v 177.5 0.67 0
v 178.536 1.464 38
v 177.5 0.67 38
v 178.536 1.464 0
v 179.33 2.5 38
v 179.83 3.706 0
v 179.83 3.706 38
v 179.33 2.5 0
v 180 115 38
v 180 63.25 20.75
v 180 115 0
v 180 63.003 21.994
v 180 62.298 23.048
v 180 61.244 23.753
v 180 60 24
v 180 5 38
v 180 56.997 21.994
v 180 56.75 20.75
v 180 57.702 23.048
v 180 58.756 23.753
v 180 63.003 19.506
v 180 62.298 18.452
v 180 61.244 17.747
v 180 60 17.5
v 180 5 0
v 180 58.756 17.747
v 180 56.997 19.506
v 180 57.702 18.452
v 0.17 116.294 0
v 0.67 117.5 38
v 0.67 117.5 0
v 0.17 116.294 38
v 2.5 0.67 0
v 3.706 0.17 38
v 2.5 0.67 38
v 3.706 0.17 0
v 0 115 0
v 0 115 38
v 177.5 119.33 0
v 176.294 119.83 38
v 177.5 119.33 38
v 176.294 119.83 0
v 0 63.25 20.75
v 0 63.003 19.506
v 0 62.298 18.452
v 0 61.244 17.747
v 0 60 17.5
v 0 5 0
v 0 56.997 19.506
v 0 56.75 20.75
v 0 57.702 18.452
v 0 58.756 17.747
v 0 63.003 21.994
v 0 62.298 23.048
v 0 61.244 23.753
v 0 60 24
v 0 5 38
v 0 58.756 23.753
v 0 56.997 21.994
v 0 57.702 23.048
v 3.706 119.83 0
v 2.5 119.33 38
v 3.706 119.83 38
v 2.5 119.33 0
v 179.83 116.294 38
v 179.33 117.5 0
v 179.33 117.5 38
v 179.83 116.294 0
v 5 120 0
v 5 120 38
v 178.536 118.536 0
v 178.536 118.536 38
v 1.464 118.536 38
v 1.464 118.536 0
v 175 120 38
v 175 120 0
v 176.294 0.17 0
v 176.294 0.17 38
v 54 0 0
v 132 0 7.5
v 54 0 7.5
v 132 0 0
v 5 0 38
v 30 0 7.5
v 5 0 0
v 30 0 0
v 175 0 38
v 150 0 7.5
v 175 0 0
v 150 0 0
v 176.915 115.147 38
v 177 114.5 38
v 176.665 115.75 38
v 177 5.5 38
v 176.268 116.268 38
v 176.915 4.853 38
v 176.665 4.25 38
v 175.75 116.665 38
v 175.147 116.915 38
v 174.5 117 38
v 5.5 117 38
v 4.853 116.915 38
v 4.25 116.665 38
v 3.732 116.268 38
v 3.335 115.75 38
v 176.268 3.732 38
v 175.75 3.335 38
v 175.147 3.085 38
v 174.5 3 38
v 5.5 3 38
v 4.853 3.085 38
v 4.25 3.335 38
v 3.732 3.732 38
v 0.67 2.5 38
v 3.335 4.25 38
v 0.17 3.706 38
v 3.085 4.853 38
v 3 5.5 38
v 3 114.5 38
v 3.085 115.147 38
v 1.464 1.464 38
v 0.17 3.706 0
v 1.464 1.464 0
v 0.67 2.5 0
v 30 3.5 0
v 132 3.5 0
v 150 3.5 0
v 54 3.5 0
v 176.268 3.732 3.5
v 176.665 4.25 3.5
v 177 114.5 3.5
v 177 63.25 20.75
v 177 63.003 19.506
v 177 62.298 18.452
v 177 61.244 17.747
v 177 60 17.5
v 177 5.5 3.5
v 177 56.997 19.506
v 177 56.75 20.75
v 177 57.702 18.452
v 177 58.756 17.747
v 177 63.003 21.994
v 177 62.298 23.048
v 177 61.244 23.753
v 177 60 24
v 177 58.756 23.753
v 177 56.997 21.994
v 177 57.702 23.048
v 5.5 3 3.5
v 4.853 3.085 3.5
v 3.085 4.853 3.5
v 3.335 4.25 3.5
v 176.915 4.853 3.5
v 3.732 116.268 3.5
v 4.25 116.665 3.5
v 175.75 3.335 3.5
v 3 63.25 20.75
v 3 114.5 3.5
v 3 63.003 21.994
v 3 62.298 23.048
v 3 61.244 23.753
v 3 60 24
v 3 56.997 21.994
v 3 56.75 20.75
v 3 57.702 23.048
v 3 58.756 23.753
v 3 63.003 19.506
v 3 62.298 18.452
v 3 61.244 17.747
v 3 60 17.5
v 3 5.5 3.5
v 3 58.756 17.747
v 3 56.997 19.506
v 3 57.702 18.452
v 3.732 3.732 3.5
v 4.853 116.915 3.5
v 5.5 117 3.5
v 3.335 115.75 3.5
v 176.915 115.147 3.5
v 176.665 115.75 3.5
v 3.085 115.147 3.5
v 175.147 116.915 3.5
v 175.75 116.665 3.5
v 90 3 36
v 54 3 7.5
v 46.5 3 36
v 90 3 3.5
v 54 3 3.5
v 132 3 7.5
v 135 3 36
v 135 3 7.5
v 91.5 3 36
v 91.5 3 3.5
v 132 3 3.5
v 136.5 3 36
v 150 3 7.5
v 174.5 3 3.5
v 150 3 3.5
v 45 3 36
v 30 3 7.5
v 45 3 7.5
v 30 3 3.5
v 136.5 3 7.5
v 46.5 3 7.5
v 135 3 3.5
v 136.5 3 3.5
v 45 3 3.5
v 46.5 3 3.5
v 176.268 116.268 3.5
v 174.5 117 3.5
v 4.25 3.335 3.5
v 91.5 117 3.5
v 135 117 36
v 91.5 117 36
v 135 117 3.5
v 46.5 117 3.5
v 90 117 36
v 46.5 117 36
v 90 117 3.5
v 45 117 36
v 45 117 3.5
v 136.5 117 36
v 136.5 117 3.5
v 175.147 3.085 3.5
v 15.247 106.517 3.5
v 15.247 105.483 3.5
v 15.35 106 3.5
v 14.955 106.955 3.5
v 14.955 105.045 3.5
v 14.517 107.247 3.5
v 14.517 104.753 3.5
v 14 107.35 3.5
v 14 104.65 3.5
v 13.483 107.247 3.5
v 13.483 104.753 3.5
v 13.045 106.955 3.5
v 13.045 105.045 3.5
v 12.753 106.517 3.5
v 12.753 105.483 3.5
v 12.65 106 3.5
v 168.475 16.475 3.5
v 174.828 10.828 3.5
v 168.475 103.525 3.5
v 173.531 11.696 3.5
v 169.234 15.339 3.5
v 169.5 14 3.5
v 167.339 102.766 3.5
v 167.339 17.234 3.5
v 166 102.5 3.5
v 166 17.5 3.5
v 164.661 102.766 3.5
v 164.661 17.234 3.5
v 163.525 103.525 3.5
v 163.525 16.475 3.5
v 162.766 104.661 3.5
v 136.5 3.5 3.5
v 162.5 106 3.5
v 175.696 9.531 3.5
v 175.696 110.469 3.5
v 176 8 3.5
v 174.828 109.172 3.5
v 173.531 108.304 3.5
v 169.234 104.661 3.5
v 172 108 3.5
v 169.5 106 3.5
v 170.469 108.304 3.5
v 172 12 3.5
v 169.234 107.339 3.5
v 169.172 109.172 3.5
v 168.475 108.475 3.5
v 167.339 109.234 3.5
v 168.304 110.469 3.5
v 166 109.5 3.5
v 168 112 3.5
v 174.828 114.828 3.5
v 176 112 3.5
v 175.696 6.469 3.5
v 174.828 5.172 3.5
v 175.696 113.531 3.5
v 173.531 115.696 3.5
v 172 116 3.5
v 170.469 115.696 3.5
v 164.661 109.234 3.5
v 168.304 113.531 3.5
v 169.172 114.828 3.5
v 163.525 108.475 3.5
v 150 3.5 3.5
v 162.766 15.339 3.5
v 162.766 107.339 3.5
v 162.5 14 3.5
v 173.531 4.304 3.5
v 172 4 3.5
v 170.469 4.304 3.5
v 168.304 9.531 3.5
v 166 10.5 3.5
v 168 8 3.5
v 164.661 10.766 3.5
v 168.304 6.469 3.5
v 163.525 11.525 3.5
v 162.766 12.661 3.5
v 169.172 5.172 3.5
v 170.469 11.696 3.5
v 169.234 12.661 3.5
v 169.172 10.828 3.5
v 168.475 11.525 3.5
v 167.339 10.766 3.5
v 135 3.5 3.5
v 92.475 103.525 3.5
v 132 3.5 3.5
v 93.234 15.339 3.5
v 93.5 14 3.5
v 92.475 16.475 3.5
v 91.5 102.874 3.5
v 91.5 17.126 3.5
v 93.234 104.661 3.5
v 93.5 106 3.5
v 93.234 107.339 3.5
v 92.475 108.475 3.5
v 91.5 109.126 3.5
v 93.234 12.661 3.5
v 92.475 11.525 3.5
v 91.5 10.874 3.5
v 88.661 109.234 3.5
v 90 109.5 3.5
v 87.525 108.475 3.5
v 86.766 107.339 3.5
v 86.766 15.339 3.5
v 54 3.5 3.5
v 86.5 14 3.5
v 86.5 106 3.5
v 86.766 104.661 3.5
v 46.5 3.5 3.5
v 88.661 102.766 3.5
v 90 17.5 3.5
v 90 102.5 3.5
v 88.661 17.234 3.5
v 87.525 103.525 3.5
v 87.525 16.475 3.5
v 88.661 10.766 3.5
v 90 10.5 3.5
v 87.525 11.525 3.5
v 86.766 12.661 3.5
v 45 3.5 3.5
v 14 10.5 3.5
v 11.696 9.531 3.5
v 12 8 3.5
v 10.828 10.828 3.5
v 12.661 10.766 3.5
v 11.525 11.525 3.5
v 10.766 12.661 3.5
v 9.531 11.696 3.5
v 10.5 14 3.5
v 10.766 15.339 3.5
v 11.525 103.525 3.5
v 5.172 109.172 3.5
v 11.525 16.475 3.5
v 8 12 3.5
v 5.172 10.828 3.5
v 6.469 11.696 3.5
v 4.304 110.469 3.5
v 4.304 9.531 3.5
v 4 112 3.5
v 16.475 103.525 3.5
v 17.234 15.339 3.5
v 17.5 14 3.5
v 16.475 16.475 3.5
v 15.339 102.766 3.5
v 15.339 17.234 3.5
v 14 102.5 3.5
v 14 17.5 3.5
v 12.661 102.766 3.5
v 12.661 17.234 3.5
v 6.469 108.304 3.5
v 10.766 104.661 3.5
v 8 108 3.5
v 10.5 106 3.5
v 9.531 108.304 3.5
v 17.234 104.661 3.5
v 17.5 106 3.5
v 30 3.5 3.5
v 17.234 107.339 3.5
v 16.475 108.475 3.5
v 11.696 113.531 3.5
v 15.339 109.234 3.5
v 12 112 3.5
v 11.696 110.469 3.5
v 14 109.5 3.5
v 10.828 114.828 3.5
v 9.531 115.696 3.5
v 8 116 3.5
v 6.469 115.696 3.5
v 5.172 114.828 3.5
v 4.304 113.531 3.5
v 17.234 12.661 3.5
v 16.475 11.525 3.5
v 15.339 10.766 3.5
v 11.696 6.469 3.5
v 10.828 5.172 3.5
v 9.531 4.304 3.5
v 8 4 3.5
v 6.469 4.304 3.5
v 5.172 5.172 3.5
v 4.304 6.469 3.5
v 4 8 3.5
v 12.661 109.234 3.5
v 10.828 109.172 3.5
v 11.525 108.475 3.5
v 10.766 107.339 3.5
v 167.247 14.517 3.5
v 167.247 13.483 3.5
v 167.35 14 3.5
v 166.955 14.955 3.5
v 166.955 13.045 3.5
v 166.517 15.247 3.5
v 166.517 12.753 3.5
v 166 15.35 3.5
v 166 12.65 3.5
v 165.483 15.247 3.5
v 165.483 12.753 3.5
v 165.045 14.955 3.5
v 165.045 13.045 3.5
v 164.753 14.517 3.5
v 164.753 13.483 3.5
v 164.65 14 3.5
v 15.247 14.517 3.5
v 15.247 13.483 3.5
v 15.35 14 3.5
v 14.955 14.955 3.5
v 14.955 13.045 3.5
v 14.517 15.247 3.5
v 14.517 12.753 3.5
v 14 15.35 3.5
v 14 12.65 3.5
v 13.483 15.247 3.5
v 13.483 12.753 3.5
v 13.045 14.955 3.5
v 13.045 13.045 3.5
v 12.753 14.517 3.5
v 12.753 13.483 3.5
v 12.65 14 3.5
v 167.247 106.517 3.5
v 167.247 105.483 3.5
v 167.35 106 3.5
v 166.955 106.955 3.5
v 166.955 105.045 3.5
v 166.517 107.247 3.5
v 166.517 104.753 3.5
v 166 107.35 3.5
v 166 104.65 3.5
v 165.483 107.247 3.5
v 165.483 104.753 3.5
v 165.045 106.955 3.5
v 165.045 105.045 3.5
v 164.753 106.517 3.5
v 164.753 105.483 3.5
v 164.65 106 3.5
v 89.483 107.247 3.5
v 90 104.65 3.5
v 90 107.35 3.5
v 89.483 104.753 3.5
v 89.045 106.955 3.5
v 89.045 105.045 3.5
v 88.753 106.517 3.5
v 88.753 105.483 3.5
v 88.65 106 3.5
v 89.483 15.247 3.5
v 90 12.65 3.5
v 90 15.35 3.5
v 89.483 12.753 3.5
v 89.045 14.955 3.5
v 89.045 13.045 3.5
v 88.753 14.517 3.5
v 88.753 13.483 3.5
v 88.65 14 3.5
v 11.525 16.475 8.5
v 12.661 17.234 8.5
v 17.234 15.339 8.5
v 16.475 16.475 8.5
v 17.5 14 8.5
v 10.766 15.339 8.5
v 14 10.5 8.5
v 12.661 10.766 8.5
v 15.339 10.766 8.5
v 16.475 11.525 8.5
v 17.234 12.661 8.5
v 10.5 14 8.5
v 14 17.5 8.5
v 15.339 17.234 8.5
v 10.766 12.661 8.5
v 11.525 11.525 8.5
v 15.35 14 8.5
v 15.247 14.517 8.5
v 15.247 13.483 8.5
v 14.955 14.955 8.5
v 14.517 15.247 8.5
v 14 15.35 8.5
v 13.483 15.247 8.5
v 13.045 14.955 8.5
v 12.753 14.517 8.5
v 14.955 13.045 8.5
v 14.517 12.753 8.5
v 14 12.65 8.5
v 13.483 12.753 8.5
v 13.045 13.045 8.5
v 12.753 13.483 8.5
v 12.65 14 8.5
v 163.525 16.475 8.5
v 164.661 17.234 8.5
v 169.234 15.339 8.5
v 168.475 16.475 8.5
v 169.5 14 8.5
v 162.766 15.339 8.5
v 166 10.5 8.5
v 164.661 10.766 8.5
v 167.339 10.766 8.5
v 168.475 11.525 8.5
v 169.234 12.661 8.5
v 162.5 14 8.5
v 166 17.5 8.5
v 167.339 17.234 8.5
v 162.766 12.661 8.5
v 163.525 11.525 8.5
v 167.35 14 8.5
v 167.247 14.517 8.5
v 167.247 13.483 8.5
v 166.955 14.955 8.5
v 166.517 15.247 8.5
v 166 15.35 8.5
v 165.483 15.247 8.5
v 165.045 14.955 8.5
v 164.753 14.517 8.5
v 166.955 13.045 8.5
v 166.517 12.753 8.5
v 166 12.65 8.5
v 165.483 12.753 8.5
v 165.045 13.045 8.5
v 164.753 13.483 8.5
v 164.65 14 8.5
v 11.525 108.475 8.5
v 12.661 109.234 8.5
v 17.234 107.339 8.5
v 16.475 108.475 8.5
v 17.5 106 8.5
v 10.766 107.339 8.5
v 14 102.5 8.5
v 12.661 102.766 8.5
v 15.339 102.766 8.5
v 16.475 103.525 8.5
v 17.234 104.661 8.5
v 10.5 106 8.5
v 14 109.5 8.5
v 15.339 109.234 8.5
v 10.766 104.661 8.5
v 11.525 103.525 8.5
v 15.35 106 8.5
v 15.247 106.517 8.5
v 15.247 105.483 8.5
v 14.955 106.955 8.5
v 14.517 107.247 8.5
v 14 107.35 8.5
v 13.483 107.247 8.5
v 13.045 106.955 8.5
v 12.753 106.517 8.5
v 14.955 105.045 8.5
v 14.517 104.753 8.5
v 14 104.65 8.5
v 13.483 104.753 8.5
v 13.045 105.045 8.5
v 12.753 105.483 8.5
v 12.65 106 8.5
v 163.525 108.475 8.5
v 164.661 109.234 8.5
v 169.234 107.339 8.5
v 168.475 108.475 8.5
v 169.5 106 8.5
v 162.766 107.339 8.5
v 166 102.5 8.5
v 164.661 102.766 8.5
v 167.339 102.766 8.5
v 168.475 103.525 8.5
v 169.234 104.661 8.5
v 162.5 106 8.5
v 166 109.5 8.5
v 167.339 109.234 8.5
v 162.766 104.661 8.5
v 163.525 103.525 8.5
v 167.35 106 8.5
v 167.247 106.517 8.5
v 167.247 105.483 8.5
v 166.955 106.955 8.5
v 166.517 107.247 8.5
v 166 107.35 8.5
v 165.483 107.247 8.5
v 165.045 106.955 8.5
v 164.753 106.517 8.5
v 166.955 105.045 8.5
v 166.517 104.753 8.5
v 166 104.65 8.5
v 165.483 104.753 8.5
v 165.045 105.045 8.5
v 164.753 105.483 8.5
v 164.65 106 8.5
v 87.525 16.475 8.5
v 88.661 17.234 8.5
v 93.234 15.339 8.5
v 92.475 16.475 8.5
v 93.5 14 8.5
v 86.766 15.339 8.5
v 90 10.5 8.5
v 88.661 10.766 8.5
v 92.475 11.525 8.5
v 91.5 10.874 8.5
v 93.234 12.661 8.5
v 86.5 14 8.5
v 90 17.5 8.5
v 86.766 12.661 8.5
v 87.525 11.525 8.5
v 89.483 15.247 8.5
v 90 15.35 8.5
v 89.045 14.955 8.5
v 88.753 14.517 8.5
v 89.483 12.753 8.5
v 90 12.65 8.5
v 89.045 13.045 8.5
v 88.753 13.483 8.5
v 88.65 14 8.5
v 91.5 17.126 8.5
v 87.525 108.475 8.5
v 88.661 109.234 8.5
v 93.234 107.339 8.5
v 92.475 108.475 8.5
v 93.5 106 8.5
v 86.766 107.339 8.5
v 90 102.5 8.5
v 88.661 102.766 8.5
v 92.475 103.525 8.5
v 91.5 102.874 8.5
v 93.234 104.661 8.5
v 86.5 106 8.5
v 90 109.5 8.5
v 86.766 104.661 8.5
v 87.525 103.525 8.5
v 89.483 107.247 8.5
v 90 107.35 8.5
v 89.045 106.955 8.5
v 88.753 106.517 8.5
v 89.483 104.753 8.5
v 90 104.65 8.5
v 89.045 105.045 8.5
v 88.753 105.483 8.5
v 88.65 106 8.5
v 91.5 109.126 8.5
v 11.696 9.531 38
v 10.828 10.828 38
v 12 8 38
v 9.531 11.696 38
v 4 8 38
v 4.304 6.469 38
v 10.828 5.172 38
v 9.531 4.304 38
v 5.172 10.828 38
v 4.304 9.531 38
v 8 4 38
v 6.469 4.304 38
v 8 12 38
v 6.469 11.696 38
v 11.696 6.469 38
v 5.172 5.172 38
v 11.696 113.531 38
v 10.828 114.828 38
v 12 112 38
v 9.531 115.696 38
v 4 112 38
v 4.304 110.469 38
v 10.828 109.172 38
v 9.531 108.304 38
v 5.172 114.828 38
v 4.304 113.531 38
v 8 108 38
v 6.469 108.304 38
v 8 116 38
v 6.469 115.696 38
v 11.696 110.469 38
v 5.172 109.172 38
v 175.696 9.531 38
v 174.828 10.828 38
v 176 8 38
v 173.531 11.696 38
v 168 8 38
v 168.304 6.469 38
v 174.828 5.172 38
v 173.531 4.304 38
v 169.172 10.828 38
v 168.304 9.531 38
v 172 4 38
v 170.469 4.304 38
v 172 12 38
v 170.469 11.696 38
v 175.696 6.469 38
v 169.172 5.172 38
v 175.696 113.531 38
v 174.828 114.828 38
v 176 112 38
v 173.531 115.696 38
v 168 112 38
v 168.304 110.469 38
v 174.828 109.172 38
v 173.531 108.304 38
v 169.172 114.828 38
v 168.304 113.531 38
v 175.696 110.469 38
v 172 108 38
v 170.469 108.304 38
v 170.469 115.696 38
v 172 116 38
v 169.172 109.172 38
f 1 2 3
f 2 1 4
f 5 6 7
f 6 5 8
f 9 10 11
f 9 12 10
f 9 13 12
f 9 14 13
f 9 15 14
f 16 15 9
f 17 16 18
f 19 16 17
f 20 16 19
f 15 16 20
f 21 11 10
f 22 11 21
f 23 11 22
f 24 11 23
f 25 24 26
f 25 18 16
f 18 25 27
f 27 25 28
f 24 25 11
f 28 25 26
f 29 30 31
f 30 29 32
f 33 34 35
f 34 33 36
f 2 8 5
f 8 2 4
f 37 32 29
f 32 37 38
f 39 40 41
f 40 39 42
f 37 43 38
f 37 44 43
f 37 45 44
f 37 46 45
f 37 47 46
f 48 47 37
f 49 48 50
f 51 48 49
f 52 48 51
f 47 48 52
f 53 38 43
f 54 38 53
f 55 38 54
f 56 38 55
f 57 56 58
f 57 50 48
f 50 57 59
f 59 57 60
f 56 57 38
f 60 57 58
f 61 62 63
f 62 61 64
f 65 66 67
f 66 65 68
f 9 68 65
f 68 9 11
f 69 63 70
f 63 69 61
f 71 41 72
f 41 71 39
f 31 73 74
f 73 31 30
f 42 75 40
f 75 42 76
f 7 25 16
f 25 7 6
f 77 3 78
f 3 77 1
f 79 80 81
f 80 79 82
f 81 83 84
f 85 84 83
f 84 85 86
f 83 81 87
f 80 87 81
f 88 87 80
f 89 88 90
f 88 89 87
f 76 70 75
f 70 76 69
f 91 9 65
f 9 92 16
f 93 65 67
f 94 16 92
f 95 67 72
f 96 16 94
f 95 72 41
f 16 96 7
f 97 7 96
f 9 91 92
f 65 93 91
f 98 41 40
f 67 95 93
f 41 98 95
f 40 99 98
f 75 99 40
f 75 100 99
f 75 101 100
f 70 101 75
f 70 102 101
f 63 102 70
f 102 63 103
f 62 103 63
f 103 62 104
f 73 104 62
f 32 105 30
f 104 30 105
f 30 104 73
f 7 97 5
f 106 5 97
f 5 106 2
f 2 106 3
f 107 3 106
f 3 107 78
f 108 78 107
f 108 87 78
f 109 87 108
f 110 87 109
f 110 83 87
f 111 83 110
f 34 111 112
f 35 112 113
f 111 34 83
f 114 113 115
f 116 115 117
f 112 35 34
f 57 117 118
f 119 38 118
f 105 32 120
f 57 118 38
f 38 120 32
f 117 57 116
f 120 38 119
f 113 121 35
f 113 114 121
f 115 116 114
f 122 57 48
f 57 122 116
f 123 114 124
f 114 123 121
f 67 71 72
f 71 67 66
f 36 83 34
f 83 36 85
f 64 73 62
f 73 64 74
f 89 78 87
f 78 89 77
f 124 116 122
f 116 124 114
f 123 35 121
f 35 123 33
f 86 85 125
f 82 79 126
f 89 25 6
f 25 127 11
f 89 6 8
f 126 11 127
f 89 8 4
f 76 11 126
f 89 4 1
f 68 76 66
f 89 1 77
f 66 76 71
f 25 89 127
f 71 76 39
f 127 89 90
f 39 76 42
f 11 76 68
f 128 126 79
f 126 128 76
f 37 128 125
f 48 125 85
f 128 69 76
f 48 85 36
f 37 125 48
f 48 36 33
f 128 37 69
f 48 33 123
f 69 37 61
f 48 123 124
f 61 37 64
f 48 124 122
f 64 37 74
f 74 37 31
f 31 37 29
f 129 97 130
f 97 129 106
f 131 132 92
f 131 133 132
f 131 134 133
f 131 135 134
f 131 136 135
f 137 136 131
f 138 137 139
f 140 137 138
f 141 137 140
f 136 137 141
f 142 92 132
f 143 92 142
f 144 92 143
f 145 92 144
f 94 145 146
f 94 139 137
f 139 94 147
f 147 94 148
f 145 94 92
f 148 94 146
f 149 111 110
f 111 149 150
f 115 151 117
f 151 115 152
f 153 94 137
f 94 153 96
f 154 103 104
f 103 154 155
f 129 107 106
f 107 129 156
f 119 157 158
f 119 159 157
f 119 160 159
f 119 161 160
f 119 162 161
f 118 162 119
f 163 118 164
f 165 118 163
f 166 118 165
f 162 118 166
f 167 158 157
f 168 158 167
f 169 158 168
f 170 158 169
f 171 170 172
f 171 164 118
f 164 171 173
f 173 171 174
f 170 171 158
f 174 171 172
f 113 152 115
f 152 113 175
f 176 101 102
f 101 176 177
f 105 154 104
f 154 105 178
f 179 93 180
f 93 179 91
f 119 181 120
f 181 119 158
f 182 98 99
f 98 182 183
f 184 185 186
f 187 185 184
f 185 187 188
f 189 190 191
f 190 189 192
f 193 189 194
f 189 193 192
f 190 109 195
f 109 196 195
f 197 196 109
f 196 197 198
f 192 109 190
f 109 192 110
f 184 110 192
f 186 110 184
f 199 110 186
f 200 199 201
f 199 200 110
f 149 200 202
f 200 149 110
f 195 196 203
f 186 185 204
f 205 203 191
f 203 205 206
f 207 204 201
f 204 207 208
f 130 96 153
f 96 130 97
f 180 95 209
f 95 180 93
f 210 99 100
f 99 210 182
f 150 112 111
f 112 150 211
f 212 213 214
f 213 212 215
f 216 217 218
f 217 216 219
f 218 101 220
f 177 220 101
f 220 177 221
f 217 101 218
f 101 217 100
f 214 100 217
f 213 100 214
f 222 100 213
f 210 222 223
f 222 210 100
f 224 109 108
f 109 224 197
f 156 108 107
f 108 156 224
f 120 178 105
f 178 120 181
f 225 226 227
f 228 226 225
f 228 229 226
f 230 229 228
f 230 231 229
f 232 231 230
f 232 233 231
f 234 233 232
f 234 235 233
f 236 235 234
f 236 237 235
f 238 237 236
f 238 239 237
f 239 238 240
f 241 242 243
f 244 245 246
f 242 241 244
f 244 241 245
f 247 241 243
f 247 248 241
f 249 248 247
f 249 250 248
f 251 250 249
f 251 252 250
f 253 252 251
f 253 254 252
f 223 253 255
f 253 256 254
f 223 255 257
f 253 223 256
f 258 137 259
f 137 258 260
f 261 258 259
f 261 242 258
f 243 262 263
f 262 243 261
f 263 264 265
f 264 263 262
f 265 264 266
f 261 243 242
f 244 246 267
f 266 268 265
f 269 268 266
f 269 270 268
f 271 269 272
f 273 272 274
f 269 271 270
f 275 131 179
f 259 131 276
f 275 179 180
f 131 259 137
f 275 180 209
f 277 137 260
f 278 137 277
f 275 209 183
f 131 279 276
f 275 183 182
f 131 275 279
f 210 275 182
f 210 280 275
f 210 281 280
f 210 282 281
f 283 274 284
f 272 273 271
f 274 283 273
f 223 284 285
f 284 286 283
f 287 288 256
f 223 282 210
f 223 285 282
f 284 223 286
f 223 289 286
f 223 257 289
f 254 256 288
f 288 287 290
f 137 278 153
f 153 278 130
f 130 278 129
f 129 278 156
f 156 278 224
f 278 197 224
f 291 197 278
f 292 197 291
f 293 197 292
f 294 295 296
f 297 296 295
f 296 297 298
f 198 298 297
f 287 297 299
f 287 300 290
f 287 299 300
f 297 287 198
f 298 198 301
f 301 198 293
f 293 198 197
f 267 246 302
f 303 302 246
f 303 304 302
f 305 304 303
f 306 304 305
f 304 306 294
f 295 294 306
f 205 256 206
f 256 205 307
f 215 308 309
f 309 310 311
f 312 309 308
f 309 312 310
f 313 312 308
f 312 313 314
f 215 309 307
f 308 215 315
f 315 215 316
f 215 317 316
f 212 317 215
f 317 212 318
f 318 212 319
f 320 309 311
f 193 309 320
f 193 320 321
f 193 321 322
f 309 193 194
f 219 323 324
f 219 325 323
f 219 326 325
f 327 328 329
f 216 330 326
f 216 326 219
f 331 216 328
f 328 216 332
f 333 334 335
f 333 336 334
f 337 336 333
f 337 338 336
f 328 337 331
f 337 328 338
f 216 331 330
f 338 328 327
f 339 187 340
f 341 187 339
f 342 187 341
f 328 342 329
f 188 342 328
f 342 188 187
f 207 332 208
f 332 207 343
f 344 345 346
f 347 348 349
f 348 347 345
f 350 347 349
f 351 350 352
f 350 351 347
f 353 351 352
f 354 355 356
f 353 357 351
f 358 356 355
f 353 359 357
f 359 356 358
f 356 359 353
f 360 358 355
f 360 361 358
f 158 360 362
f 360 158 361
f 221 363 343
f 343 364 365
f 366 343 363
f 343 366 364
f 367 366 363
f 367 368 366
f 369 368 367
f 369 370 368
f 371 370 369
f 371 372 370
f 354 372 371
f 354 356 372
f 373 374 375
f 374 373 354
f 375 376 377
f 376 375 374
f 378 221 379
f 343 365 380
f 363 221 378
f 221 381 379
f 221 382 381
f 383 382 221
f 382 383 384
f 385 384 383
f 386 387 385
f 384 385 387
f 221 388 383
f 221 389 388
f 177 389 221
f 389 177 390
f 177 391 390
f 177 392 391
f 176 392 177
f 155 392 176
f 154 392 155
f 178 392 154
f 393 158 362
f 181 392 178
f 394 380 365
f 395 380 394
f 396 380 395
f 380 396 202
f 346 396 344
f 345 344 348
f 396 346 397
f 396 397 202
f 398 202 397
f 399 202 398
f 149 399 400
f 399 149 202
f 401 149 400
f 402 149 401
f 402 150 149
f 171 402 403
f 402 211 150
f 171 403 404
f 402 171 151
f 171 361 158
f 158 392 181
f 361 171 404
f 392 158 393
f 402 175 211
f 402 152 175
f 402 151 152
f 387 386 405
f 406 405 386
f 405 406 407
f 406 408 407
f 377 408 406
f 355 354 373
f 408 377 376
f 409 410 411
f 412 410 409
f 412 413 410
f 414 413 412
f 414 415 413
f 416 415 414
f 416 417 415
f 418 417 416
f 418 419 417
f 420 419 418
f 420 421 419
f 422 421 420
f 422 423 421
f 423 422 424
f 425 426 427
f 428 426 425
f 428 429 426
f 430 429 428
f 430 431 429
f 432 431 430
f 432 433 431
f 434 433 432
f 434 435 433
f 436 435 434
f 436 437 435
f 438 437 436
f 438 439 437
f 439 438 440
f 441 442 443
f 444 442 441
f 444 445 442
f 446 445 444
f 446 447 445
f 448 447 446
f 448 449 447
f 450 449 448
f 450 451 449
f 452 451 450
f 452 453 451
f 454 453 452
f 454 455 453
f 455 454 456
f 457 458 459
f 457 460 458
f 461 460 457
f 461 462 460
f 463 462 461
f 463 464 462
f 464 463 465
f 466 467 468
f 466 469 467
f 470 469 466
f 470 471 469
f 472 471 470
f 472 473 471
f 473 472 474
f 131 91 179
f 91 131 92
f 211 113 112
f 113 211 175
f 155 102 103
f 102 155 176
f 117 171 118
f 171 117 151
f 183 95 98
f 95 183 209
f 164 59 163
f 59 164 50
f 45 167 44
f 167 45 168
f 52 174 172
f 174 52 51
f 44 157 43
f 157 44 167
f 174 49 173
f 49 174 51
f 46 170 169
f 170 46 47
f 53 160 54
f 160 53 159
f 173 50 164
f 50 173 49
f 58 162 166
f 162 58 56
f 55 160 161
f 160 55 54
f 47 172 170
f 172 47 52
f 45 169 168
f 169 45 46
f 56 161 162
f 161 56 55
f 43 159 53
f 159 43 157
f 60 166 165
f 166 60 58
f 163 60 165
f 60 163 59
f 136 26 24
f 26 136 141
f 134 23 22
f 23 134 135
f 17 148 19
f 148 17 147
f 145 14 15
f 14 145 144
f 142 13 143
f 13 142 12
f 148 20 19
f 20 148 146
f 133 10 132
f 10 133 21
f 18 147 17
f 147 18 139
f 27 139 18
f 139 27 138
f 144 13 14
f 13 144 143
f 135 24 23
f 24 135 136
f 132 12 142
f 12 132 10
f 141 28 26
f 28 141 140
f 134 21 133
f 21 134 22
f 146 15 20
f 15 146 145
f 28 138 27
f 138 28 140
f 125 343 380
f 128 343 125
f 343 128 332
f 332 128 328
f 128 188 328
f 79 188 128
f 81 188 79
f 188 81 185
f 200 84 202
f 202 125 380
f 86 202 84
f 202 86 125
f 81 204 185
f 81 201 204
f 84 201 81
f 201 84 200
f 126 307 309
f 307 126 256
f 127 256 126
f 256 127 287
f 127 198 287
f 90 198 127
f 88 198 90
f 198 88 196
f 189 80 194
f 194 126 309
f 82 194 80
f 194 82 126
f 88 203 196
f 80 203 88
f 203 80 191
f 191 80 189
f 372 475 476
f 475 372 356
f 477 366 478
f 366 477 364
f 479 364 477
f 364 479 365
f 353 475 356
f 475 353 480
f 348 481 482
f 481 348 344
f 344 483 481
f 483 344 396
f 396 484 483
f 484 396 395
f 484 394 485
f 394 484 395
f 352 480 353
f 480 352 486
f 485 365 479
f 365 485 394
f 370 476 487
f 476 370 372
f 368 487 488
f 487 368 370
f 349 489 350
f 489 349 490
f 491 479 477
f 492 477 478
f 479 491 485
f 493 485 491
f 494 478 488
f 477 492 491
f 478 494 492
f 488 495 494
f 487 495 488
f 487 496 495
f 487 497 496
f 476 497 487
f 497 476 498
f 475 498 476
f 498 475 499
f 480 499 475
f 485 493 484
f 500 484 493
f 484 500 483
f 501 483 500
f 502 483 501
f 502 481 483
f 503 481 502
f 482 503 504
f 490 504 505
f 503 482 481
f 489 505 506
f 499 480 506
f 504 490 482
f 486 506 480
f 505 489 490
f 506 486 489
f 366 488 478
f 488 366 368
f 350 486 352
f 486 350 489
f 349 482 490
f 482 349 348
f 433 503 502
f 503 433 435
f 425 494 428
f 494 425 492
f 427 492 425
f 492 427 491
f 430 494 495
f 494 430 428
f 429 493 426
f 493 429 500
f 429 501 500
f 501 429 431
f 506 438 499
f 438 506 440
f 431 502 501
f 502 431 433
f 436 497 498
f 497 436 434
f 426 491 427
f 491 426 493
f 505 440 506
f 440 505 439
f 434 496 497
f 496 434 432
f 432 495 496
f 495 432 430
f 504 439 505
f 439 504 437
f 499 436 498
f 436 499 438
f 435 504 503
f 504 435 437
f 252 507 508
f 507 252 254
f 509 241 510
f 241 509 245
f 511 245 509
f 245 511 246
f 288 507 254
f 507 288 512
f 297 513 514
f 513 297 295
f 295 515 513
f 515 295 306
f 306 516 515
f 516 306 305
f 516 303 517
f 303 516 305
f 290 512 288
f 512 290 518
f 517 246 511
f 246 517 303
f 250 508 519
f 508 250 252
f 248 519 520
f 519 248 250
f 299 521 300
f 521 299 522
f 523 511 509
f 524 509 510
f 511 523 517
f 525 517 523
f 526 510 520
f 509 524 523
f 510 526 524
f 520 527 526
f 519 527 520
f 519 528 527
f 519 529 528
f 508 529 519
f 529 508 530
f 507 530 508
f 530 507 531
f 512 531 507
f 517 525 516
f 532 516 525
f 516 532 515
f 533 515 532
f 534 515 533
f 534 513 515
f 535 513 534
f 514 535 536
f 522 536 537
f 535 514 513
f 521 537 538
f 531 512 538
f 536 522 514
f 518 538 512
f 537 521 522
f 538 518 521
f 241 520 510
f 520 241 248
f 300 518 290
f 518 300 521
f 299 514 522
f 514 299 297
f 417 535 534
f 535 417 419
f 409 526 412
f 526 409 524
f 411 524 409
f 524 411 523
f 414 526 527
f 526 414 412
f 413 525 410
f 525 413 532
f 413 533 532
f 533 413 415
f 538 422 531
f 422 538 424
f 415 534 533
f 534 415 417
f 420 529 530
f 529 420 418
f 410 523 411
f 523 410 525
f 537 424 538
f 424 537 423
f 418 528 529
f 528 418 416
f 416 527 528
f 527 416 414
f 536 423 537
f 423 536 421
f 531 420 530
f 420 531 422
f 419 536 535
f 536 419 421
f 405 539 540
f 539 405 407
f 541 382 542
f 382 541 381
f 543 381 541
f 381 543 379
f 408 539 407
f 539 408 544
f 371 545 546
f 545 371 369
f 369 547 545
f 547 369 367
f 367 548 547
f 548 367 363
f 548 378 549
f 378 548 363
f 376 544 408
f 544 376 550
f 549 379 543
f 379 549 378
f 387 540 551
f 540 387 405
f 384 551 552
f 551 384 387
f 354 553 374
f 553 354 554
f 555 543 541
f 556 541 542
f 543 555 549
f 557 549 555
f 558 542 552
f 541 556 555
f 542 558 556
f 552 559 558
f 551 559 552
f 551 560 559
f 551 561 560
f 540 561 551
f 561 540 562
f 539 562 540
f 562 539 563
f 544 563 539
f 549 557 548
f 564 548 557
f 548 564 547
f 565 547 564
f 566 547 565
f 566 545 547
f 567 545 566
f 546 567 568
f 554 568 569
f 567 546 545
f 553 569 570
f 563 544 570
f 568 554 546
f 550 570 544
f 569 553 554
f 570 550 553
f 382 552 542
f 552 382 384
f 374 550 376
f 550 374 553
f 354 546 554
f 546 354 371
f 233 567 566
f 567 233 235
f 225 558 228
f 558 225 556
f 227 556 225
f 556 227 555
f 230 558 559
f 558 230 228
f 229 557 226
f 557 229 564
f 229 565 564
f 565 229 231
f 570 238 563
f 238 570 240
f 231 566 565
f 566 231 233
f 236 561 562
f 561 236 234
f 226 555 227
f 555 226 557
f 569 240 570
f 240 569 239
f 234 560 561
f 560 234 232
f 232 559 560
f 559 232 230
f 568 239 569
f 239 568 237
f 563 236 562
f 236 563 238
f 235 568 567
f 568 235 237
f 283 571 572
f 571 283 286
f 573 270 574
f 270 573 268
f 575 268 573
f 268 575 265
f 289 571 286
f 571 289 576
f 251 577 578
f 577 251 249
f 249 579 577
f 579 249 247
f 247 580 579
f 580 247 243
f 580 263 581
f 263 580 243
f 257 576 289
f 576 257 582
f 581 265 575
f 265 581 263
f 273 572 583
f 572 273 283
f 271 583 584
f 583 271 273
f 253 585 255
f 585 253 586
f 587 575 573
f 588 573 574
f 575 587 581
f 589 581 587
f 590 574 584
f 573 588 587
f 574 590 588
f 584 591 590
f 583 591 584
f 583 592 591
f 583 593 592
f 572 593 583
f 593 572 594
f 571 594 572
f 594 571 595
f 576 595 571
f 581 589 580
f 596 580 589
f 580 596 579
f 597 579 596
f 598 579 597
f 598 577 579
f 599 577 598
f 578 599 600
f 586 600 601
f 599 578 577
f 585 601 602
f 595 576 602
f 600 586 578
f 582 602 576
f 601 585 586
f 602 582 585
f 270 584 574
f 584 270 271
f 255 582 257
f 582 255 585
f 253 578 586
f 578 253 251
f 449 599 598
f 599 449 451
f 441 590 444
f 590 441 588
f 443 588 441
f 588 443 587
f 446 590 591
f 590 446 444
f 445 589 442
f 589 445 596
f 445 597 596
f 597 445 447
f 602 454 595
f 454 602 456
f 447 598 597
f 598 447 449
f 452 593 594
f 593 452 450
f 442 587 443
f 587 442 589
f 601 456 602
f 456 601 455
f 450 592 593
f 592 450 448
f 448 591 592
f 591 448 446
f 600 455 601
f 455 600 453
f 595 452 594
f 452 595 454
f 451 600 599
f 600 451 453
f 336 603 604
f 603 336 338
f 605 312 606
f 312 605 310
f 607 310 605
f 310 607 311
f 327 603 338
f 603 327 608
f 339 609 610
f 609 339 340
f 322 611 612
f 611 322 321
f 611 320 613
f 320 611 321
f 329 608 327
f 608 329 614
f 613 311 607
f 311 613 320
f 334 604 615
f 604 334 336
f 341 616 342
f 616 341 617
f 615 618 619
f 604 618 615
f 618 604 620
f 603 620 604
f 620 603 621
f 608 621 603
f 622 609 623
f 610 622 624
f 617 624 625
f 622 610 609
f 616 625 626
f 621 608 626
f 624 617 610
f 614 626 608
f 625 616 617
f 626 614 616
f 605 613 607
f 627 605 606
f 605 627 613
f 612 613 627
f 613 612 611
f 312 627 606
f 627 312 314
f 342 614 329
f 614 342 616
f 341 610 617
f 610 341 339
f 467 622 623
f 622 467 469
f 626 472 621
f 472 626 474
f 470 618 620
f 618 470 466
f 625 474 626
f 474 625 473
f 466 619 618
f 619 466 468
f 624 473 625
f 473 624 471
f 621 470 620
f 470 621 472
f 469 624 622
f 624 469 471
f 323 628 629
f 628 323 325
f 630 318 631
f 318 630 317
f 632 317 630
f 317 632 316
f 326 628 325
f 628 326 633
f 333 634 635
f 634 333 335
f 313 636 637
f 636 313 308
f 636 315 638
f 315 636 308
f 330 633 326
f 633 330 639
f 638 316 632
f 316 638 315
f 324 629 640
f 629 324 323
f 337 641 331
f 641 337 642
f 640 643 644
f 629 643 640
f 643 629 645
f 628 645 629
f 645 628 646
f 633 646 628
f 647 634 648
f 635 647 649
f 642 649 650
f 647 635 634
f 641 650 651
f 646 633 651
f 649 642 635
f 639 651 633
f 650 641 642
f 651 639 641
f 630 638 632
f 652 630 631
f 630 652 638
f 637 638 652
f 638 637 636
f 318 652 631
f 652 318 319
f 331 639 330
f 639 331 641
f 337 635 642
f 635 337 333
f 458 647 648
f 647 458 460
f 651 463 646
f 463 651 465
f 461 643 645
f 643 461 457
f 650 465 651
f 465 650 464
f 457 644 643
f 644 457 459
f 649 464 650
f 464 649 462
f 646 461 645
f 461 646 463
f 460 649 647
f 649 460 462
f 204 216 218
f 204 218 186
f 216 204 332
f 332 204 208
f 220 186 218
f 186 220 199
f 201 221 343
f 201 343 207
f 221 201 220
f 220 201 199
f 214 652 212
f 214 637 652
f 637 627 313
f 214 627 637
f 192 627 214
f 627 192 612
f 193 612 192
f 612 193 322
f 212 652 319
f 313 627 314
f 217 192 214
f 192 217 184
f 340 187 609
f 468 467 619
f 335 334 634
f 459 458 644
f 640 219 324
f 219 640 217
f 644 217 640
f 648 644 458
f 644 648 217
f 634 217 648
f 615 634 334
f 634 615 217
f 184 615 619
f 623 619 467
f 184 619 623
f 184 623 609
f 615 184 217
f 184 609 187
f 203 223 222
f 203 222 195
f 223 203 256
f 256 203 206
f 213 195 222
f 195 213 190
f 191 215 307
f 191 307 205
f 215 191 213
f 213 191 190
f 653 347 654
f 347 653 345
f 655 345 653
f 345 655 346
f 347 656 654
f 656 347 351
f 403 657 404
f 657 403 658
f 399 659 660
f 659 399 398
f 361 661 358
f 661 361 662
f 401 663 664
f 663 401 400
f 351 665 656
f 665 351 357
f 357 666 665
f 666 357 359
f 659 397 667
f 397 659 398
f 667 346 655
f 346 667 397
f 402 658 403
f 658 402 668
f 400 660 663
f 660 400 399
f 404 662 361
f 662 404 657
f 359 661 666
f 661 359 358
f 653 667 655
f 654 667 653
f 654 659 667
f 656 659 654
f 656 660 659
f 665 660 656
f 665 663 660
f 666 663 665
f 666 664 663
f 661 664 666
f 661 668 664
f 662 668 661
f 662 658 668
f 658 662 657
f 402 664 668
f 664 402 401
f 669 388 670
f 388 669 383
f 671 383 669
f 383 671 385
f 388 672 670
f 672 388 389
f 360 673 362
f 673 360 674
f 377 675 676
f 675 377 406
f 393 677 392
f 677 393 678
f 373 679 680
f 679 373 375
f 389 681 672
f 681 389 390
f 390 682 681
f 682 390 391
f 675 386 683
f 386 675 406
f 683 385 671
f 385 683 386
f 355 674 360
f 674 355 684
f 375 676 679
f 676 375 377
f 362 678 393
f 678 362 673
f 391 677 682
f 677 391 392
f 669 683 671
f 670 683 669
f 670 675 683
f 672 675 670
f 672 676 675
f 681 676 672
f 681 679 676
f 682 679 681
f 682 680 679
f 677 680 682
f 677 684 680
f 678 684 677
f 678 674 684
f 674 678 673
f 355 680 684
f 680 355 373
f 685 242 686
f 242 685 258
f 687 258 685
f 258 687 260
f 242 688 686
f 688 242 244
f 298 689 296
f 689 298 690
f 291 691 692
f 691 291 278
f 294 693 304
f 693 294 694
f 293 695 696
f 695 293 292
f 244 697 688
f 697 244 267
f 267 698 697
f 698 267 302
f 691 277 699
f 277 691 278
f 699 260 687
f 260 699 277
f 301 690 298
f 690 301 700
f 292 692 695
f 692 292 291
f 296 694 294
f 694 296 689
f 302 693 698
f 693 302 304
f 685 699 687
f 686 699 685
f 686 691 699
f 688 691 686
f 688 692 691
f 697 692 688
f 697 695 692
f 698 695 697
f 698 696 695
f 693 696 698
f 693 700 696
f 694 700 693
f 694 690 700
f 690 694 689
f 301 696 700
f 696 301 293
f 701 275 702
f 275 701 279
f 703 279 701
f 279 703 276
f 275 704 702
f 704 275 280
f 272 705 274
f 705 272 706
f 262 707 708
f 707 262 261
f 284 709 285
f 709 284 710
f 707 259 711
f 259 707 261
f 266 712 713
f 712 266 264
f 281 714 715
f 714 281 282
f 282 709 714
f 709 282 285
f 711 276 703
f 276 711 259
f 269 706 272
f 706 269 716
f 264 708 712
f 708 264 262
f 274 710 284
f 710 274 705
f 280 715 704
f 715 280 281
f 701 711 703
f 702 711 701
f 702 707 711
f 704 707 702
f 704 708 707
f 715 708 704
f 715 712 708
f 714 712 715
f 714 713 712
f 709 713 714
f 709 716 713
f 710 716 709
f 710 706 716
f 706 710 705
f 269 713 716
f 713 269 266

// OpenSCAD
/**
 * preselector_box.scad — TM-SDR-ENC-002 Rev A
 * RF-Shielded Enclosure for 16-Band Switchable Preselector Filter Board
 *
 * Features:
 *   - Houses 160×100 mm filter PCB
 *   - SMA IN and SMA OUT on opposite ends
 *   - 8-pin and 6-pin IDC connectors for control board
 *   - Alignment dividers between filter sections (internal RF isolation)
 *   - Copper-tape shielding cavity
 *   - M3 screw-together (no snap-fit, more rigid for RF)
 *
 * Envelope: 180×120×50 mm
 * Material: PETG + copper tape or aluminum foil lining
 */

// ── Parameters ─────────────────────────────────────────────────────────────
box_w   = 180.0;
box_d   = 120.0;
box_h   = 50.0;
wall    = 3.0;
floor_h = 3.5;
lid_h   = 12.0;
body_h  = box_h - lid_h;

// PCB
pcb_w   = 160.0;
pcb_d   = 100.0;
pcb_so_h = 5.0;
pcb_so_od = 7.0;
pcb_so_id = 2.7;

// Connectors
sma_hole_d   = 6.5;
idc8_w       = 24.0;
idc8_h        = 9.0;
idc6_w       = 18.0;
idc6_h        = 9.0;

// Internal dividers (RF isolation between filter groups)
div_count = 3;   // creates 4 sections

// Corner screw posts
screw_d  = 3.3;   // M3 clearance
boss_d   = 8.0;
boss_h   = body_h;

r = 5.0;
$fn = 32;

module rounded_box(w, d, h, r_) {
    hull()
        for (x=[r_, w-r_]) for (y=[r_, d-r_])
            translate([x, y, 0]) cylinder(h=h, r=r_, $fn=24);
}

module pcb_standoff(x, y) {
    translate([x, y, floor_h])
        difference() {
            cylinder(h=pcb_so_h, d=pcb_so_od, $fn=16);
            translate([0,0,-0.5]) cylinder(h=pcb_so_h+1, d=pcb_so_id, $fn=16);
        }
}

module body() {
    difference() {
        rounded_box(box_w, box_d, body_h, r);

        // Inner cavity
        translate([wall, wall, floor_h])
            rounded_box(box_w-2*wall, box_d-2*wall, body_h, r-wall+0.5);

        // SMA IN: left end face, vertically centered
        translate([-0.5, box_d/2, floor_h + (body_h - floor_h)/2])
        rotate([0, 90, 0])
            cylinder(h=wall+1, d=sma_hole_d, $fn=16);

        // SMA OUT: right end face
        translate([box_w+0.5, box_d/2, floor_h + (body_h - floor_h)/2])
        rotate([0, -90, 0])
            cylinder(h=wall+1, d=sma_hole_d, $fn=16);

        // IDC 8-pin control connector: rear face, left half
        translate([30, -0.5, floor_h + 4])
        rotate([-90,0,0])
            cube([idc8_w, idc8_h, wall+1]);

        // IDC 6-pin: rear face, right half
        translate([box_w - 30 - idc6_w, -0.5, floor_h + 4])
        rotate([-90,0,0])
            cube([idc6_w, idc6_h, wall+1]);

        // Screw holes at four corners (M3)
        for (x=[8, box_w-8]) for (y=[8, box_d-8])
            translate([x, y, body_h - 6]) {
                cylinder(h=7, d=screw_d, $fn=16);
                cylinder(h=3, d=boss_d,  $fn=16);  // counterbore
            }
    }

    // PCB standoffs (4 corners + 2 mid span)
    ox = (box_w - pcb_w) / 2;
    oy = (box_d - pcb_d) / 2;
    pcb_standoff(ox + 4,        oy + 4);
    pcb_standoff(ox + pcb_w-4,  oy + 4);
    pcb_standoff(ox + 4,        oy + pcb_d-4);
    pcb_standoff(ox + pcb_w-4,  oy + pcb_d-4);
    pcb_standoff(ox + pcb_w/2,  oy + 4);         // center front
    pcb_standoff(ox + pcb_w/2,  oy + pcb_d-4);   // center rear

    // Internal RF isolation dividers
    // Three dividers split the filter board into 4 sections (HF-lo, HF-hi, VHF, UHF)
    div_positions = [box_w * 0.25, box_w * 0.5, box_w * 0.75];
    for (xd = div_positions) {
        translate([xd, wall, floor_h])
            cube([1.5, box_d-2*wall, body_h - floor_h - 2]);
    }

    // Boss posts at corners for screw thread engagement
    for (x=[8, box_w-8]) for (y=[8, box_d-8])
        translate([x, y, 0])
            cylinder(h=boss_h, d=boss_d, $fn=16);
}

module lid() {
    flange_w = box_w - 2*(wall + 1.0);
    flange_d = box_d - 2*(wall + 1.0);
    fl_depth = 4.0;
    lid_plate_h = lid_h - fl_depth;

    difference() {
        union() {
            rounded_box(box_w, box_d, lid_plate_h, r);
            translate([wall+1, wall+1, lid_plate_h])
                rounded_box(flange_w, flange_d, fl_depth, r-wall);
        }
        // Screw through holes
        for (x=[8, box_w-8]) for (y=[8, box_d-8])
            translate([x, y, -0.5])
                cylinder(h=lid_h+1, d=screw_d, $fn=16);

        // Label recess (optional, for band labels)
        translate([20, box_d/2-8, -0.5])
            cube([box_w-40, 16, 1.5]);
    }
}

// ── Assembly notes ─────────────────────────────────────────────────────────
// 1. Print body and lid in PETG.
// 2. Line inside with copper tape (walls, floor). Solder seams.
// 3. Install PCB on standoffs with M2.5 or M3 screws (which ground the PCB to shield).
// 4. Route SMA pigtails through the SMA holes; mount SMA connectors.
// 5. Route IDC ribbon cables to ESP32 controller box.
// 6. Apply copper tape to lid interior. Lid copper must contact body copper rim.
//    Use copper tape strip around lid flange to ensure contact when lid is closed.

print_part = "body";  // "body" | "lid"

if (print_part == "body") {
    color("silver", 0.9) body();
} else {
    color("gray", 0.9) lid();
}
